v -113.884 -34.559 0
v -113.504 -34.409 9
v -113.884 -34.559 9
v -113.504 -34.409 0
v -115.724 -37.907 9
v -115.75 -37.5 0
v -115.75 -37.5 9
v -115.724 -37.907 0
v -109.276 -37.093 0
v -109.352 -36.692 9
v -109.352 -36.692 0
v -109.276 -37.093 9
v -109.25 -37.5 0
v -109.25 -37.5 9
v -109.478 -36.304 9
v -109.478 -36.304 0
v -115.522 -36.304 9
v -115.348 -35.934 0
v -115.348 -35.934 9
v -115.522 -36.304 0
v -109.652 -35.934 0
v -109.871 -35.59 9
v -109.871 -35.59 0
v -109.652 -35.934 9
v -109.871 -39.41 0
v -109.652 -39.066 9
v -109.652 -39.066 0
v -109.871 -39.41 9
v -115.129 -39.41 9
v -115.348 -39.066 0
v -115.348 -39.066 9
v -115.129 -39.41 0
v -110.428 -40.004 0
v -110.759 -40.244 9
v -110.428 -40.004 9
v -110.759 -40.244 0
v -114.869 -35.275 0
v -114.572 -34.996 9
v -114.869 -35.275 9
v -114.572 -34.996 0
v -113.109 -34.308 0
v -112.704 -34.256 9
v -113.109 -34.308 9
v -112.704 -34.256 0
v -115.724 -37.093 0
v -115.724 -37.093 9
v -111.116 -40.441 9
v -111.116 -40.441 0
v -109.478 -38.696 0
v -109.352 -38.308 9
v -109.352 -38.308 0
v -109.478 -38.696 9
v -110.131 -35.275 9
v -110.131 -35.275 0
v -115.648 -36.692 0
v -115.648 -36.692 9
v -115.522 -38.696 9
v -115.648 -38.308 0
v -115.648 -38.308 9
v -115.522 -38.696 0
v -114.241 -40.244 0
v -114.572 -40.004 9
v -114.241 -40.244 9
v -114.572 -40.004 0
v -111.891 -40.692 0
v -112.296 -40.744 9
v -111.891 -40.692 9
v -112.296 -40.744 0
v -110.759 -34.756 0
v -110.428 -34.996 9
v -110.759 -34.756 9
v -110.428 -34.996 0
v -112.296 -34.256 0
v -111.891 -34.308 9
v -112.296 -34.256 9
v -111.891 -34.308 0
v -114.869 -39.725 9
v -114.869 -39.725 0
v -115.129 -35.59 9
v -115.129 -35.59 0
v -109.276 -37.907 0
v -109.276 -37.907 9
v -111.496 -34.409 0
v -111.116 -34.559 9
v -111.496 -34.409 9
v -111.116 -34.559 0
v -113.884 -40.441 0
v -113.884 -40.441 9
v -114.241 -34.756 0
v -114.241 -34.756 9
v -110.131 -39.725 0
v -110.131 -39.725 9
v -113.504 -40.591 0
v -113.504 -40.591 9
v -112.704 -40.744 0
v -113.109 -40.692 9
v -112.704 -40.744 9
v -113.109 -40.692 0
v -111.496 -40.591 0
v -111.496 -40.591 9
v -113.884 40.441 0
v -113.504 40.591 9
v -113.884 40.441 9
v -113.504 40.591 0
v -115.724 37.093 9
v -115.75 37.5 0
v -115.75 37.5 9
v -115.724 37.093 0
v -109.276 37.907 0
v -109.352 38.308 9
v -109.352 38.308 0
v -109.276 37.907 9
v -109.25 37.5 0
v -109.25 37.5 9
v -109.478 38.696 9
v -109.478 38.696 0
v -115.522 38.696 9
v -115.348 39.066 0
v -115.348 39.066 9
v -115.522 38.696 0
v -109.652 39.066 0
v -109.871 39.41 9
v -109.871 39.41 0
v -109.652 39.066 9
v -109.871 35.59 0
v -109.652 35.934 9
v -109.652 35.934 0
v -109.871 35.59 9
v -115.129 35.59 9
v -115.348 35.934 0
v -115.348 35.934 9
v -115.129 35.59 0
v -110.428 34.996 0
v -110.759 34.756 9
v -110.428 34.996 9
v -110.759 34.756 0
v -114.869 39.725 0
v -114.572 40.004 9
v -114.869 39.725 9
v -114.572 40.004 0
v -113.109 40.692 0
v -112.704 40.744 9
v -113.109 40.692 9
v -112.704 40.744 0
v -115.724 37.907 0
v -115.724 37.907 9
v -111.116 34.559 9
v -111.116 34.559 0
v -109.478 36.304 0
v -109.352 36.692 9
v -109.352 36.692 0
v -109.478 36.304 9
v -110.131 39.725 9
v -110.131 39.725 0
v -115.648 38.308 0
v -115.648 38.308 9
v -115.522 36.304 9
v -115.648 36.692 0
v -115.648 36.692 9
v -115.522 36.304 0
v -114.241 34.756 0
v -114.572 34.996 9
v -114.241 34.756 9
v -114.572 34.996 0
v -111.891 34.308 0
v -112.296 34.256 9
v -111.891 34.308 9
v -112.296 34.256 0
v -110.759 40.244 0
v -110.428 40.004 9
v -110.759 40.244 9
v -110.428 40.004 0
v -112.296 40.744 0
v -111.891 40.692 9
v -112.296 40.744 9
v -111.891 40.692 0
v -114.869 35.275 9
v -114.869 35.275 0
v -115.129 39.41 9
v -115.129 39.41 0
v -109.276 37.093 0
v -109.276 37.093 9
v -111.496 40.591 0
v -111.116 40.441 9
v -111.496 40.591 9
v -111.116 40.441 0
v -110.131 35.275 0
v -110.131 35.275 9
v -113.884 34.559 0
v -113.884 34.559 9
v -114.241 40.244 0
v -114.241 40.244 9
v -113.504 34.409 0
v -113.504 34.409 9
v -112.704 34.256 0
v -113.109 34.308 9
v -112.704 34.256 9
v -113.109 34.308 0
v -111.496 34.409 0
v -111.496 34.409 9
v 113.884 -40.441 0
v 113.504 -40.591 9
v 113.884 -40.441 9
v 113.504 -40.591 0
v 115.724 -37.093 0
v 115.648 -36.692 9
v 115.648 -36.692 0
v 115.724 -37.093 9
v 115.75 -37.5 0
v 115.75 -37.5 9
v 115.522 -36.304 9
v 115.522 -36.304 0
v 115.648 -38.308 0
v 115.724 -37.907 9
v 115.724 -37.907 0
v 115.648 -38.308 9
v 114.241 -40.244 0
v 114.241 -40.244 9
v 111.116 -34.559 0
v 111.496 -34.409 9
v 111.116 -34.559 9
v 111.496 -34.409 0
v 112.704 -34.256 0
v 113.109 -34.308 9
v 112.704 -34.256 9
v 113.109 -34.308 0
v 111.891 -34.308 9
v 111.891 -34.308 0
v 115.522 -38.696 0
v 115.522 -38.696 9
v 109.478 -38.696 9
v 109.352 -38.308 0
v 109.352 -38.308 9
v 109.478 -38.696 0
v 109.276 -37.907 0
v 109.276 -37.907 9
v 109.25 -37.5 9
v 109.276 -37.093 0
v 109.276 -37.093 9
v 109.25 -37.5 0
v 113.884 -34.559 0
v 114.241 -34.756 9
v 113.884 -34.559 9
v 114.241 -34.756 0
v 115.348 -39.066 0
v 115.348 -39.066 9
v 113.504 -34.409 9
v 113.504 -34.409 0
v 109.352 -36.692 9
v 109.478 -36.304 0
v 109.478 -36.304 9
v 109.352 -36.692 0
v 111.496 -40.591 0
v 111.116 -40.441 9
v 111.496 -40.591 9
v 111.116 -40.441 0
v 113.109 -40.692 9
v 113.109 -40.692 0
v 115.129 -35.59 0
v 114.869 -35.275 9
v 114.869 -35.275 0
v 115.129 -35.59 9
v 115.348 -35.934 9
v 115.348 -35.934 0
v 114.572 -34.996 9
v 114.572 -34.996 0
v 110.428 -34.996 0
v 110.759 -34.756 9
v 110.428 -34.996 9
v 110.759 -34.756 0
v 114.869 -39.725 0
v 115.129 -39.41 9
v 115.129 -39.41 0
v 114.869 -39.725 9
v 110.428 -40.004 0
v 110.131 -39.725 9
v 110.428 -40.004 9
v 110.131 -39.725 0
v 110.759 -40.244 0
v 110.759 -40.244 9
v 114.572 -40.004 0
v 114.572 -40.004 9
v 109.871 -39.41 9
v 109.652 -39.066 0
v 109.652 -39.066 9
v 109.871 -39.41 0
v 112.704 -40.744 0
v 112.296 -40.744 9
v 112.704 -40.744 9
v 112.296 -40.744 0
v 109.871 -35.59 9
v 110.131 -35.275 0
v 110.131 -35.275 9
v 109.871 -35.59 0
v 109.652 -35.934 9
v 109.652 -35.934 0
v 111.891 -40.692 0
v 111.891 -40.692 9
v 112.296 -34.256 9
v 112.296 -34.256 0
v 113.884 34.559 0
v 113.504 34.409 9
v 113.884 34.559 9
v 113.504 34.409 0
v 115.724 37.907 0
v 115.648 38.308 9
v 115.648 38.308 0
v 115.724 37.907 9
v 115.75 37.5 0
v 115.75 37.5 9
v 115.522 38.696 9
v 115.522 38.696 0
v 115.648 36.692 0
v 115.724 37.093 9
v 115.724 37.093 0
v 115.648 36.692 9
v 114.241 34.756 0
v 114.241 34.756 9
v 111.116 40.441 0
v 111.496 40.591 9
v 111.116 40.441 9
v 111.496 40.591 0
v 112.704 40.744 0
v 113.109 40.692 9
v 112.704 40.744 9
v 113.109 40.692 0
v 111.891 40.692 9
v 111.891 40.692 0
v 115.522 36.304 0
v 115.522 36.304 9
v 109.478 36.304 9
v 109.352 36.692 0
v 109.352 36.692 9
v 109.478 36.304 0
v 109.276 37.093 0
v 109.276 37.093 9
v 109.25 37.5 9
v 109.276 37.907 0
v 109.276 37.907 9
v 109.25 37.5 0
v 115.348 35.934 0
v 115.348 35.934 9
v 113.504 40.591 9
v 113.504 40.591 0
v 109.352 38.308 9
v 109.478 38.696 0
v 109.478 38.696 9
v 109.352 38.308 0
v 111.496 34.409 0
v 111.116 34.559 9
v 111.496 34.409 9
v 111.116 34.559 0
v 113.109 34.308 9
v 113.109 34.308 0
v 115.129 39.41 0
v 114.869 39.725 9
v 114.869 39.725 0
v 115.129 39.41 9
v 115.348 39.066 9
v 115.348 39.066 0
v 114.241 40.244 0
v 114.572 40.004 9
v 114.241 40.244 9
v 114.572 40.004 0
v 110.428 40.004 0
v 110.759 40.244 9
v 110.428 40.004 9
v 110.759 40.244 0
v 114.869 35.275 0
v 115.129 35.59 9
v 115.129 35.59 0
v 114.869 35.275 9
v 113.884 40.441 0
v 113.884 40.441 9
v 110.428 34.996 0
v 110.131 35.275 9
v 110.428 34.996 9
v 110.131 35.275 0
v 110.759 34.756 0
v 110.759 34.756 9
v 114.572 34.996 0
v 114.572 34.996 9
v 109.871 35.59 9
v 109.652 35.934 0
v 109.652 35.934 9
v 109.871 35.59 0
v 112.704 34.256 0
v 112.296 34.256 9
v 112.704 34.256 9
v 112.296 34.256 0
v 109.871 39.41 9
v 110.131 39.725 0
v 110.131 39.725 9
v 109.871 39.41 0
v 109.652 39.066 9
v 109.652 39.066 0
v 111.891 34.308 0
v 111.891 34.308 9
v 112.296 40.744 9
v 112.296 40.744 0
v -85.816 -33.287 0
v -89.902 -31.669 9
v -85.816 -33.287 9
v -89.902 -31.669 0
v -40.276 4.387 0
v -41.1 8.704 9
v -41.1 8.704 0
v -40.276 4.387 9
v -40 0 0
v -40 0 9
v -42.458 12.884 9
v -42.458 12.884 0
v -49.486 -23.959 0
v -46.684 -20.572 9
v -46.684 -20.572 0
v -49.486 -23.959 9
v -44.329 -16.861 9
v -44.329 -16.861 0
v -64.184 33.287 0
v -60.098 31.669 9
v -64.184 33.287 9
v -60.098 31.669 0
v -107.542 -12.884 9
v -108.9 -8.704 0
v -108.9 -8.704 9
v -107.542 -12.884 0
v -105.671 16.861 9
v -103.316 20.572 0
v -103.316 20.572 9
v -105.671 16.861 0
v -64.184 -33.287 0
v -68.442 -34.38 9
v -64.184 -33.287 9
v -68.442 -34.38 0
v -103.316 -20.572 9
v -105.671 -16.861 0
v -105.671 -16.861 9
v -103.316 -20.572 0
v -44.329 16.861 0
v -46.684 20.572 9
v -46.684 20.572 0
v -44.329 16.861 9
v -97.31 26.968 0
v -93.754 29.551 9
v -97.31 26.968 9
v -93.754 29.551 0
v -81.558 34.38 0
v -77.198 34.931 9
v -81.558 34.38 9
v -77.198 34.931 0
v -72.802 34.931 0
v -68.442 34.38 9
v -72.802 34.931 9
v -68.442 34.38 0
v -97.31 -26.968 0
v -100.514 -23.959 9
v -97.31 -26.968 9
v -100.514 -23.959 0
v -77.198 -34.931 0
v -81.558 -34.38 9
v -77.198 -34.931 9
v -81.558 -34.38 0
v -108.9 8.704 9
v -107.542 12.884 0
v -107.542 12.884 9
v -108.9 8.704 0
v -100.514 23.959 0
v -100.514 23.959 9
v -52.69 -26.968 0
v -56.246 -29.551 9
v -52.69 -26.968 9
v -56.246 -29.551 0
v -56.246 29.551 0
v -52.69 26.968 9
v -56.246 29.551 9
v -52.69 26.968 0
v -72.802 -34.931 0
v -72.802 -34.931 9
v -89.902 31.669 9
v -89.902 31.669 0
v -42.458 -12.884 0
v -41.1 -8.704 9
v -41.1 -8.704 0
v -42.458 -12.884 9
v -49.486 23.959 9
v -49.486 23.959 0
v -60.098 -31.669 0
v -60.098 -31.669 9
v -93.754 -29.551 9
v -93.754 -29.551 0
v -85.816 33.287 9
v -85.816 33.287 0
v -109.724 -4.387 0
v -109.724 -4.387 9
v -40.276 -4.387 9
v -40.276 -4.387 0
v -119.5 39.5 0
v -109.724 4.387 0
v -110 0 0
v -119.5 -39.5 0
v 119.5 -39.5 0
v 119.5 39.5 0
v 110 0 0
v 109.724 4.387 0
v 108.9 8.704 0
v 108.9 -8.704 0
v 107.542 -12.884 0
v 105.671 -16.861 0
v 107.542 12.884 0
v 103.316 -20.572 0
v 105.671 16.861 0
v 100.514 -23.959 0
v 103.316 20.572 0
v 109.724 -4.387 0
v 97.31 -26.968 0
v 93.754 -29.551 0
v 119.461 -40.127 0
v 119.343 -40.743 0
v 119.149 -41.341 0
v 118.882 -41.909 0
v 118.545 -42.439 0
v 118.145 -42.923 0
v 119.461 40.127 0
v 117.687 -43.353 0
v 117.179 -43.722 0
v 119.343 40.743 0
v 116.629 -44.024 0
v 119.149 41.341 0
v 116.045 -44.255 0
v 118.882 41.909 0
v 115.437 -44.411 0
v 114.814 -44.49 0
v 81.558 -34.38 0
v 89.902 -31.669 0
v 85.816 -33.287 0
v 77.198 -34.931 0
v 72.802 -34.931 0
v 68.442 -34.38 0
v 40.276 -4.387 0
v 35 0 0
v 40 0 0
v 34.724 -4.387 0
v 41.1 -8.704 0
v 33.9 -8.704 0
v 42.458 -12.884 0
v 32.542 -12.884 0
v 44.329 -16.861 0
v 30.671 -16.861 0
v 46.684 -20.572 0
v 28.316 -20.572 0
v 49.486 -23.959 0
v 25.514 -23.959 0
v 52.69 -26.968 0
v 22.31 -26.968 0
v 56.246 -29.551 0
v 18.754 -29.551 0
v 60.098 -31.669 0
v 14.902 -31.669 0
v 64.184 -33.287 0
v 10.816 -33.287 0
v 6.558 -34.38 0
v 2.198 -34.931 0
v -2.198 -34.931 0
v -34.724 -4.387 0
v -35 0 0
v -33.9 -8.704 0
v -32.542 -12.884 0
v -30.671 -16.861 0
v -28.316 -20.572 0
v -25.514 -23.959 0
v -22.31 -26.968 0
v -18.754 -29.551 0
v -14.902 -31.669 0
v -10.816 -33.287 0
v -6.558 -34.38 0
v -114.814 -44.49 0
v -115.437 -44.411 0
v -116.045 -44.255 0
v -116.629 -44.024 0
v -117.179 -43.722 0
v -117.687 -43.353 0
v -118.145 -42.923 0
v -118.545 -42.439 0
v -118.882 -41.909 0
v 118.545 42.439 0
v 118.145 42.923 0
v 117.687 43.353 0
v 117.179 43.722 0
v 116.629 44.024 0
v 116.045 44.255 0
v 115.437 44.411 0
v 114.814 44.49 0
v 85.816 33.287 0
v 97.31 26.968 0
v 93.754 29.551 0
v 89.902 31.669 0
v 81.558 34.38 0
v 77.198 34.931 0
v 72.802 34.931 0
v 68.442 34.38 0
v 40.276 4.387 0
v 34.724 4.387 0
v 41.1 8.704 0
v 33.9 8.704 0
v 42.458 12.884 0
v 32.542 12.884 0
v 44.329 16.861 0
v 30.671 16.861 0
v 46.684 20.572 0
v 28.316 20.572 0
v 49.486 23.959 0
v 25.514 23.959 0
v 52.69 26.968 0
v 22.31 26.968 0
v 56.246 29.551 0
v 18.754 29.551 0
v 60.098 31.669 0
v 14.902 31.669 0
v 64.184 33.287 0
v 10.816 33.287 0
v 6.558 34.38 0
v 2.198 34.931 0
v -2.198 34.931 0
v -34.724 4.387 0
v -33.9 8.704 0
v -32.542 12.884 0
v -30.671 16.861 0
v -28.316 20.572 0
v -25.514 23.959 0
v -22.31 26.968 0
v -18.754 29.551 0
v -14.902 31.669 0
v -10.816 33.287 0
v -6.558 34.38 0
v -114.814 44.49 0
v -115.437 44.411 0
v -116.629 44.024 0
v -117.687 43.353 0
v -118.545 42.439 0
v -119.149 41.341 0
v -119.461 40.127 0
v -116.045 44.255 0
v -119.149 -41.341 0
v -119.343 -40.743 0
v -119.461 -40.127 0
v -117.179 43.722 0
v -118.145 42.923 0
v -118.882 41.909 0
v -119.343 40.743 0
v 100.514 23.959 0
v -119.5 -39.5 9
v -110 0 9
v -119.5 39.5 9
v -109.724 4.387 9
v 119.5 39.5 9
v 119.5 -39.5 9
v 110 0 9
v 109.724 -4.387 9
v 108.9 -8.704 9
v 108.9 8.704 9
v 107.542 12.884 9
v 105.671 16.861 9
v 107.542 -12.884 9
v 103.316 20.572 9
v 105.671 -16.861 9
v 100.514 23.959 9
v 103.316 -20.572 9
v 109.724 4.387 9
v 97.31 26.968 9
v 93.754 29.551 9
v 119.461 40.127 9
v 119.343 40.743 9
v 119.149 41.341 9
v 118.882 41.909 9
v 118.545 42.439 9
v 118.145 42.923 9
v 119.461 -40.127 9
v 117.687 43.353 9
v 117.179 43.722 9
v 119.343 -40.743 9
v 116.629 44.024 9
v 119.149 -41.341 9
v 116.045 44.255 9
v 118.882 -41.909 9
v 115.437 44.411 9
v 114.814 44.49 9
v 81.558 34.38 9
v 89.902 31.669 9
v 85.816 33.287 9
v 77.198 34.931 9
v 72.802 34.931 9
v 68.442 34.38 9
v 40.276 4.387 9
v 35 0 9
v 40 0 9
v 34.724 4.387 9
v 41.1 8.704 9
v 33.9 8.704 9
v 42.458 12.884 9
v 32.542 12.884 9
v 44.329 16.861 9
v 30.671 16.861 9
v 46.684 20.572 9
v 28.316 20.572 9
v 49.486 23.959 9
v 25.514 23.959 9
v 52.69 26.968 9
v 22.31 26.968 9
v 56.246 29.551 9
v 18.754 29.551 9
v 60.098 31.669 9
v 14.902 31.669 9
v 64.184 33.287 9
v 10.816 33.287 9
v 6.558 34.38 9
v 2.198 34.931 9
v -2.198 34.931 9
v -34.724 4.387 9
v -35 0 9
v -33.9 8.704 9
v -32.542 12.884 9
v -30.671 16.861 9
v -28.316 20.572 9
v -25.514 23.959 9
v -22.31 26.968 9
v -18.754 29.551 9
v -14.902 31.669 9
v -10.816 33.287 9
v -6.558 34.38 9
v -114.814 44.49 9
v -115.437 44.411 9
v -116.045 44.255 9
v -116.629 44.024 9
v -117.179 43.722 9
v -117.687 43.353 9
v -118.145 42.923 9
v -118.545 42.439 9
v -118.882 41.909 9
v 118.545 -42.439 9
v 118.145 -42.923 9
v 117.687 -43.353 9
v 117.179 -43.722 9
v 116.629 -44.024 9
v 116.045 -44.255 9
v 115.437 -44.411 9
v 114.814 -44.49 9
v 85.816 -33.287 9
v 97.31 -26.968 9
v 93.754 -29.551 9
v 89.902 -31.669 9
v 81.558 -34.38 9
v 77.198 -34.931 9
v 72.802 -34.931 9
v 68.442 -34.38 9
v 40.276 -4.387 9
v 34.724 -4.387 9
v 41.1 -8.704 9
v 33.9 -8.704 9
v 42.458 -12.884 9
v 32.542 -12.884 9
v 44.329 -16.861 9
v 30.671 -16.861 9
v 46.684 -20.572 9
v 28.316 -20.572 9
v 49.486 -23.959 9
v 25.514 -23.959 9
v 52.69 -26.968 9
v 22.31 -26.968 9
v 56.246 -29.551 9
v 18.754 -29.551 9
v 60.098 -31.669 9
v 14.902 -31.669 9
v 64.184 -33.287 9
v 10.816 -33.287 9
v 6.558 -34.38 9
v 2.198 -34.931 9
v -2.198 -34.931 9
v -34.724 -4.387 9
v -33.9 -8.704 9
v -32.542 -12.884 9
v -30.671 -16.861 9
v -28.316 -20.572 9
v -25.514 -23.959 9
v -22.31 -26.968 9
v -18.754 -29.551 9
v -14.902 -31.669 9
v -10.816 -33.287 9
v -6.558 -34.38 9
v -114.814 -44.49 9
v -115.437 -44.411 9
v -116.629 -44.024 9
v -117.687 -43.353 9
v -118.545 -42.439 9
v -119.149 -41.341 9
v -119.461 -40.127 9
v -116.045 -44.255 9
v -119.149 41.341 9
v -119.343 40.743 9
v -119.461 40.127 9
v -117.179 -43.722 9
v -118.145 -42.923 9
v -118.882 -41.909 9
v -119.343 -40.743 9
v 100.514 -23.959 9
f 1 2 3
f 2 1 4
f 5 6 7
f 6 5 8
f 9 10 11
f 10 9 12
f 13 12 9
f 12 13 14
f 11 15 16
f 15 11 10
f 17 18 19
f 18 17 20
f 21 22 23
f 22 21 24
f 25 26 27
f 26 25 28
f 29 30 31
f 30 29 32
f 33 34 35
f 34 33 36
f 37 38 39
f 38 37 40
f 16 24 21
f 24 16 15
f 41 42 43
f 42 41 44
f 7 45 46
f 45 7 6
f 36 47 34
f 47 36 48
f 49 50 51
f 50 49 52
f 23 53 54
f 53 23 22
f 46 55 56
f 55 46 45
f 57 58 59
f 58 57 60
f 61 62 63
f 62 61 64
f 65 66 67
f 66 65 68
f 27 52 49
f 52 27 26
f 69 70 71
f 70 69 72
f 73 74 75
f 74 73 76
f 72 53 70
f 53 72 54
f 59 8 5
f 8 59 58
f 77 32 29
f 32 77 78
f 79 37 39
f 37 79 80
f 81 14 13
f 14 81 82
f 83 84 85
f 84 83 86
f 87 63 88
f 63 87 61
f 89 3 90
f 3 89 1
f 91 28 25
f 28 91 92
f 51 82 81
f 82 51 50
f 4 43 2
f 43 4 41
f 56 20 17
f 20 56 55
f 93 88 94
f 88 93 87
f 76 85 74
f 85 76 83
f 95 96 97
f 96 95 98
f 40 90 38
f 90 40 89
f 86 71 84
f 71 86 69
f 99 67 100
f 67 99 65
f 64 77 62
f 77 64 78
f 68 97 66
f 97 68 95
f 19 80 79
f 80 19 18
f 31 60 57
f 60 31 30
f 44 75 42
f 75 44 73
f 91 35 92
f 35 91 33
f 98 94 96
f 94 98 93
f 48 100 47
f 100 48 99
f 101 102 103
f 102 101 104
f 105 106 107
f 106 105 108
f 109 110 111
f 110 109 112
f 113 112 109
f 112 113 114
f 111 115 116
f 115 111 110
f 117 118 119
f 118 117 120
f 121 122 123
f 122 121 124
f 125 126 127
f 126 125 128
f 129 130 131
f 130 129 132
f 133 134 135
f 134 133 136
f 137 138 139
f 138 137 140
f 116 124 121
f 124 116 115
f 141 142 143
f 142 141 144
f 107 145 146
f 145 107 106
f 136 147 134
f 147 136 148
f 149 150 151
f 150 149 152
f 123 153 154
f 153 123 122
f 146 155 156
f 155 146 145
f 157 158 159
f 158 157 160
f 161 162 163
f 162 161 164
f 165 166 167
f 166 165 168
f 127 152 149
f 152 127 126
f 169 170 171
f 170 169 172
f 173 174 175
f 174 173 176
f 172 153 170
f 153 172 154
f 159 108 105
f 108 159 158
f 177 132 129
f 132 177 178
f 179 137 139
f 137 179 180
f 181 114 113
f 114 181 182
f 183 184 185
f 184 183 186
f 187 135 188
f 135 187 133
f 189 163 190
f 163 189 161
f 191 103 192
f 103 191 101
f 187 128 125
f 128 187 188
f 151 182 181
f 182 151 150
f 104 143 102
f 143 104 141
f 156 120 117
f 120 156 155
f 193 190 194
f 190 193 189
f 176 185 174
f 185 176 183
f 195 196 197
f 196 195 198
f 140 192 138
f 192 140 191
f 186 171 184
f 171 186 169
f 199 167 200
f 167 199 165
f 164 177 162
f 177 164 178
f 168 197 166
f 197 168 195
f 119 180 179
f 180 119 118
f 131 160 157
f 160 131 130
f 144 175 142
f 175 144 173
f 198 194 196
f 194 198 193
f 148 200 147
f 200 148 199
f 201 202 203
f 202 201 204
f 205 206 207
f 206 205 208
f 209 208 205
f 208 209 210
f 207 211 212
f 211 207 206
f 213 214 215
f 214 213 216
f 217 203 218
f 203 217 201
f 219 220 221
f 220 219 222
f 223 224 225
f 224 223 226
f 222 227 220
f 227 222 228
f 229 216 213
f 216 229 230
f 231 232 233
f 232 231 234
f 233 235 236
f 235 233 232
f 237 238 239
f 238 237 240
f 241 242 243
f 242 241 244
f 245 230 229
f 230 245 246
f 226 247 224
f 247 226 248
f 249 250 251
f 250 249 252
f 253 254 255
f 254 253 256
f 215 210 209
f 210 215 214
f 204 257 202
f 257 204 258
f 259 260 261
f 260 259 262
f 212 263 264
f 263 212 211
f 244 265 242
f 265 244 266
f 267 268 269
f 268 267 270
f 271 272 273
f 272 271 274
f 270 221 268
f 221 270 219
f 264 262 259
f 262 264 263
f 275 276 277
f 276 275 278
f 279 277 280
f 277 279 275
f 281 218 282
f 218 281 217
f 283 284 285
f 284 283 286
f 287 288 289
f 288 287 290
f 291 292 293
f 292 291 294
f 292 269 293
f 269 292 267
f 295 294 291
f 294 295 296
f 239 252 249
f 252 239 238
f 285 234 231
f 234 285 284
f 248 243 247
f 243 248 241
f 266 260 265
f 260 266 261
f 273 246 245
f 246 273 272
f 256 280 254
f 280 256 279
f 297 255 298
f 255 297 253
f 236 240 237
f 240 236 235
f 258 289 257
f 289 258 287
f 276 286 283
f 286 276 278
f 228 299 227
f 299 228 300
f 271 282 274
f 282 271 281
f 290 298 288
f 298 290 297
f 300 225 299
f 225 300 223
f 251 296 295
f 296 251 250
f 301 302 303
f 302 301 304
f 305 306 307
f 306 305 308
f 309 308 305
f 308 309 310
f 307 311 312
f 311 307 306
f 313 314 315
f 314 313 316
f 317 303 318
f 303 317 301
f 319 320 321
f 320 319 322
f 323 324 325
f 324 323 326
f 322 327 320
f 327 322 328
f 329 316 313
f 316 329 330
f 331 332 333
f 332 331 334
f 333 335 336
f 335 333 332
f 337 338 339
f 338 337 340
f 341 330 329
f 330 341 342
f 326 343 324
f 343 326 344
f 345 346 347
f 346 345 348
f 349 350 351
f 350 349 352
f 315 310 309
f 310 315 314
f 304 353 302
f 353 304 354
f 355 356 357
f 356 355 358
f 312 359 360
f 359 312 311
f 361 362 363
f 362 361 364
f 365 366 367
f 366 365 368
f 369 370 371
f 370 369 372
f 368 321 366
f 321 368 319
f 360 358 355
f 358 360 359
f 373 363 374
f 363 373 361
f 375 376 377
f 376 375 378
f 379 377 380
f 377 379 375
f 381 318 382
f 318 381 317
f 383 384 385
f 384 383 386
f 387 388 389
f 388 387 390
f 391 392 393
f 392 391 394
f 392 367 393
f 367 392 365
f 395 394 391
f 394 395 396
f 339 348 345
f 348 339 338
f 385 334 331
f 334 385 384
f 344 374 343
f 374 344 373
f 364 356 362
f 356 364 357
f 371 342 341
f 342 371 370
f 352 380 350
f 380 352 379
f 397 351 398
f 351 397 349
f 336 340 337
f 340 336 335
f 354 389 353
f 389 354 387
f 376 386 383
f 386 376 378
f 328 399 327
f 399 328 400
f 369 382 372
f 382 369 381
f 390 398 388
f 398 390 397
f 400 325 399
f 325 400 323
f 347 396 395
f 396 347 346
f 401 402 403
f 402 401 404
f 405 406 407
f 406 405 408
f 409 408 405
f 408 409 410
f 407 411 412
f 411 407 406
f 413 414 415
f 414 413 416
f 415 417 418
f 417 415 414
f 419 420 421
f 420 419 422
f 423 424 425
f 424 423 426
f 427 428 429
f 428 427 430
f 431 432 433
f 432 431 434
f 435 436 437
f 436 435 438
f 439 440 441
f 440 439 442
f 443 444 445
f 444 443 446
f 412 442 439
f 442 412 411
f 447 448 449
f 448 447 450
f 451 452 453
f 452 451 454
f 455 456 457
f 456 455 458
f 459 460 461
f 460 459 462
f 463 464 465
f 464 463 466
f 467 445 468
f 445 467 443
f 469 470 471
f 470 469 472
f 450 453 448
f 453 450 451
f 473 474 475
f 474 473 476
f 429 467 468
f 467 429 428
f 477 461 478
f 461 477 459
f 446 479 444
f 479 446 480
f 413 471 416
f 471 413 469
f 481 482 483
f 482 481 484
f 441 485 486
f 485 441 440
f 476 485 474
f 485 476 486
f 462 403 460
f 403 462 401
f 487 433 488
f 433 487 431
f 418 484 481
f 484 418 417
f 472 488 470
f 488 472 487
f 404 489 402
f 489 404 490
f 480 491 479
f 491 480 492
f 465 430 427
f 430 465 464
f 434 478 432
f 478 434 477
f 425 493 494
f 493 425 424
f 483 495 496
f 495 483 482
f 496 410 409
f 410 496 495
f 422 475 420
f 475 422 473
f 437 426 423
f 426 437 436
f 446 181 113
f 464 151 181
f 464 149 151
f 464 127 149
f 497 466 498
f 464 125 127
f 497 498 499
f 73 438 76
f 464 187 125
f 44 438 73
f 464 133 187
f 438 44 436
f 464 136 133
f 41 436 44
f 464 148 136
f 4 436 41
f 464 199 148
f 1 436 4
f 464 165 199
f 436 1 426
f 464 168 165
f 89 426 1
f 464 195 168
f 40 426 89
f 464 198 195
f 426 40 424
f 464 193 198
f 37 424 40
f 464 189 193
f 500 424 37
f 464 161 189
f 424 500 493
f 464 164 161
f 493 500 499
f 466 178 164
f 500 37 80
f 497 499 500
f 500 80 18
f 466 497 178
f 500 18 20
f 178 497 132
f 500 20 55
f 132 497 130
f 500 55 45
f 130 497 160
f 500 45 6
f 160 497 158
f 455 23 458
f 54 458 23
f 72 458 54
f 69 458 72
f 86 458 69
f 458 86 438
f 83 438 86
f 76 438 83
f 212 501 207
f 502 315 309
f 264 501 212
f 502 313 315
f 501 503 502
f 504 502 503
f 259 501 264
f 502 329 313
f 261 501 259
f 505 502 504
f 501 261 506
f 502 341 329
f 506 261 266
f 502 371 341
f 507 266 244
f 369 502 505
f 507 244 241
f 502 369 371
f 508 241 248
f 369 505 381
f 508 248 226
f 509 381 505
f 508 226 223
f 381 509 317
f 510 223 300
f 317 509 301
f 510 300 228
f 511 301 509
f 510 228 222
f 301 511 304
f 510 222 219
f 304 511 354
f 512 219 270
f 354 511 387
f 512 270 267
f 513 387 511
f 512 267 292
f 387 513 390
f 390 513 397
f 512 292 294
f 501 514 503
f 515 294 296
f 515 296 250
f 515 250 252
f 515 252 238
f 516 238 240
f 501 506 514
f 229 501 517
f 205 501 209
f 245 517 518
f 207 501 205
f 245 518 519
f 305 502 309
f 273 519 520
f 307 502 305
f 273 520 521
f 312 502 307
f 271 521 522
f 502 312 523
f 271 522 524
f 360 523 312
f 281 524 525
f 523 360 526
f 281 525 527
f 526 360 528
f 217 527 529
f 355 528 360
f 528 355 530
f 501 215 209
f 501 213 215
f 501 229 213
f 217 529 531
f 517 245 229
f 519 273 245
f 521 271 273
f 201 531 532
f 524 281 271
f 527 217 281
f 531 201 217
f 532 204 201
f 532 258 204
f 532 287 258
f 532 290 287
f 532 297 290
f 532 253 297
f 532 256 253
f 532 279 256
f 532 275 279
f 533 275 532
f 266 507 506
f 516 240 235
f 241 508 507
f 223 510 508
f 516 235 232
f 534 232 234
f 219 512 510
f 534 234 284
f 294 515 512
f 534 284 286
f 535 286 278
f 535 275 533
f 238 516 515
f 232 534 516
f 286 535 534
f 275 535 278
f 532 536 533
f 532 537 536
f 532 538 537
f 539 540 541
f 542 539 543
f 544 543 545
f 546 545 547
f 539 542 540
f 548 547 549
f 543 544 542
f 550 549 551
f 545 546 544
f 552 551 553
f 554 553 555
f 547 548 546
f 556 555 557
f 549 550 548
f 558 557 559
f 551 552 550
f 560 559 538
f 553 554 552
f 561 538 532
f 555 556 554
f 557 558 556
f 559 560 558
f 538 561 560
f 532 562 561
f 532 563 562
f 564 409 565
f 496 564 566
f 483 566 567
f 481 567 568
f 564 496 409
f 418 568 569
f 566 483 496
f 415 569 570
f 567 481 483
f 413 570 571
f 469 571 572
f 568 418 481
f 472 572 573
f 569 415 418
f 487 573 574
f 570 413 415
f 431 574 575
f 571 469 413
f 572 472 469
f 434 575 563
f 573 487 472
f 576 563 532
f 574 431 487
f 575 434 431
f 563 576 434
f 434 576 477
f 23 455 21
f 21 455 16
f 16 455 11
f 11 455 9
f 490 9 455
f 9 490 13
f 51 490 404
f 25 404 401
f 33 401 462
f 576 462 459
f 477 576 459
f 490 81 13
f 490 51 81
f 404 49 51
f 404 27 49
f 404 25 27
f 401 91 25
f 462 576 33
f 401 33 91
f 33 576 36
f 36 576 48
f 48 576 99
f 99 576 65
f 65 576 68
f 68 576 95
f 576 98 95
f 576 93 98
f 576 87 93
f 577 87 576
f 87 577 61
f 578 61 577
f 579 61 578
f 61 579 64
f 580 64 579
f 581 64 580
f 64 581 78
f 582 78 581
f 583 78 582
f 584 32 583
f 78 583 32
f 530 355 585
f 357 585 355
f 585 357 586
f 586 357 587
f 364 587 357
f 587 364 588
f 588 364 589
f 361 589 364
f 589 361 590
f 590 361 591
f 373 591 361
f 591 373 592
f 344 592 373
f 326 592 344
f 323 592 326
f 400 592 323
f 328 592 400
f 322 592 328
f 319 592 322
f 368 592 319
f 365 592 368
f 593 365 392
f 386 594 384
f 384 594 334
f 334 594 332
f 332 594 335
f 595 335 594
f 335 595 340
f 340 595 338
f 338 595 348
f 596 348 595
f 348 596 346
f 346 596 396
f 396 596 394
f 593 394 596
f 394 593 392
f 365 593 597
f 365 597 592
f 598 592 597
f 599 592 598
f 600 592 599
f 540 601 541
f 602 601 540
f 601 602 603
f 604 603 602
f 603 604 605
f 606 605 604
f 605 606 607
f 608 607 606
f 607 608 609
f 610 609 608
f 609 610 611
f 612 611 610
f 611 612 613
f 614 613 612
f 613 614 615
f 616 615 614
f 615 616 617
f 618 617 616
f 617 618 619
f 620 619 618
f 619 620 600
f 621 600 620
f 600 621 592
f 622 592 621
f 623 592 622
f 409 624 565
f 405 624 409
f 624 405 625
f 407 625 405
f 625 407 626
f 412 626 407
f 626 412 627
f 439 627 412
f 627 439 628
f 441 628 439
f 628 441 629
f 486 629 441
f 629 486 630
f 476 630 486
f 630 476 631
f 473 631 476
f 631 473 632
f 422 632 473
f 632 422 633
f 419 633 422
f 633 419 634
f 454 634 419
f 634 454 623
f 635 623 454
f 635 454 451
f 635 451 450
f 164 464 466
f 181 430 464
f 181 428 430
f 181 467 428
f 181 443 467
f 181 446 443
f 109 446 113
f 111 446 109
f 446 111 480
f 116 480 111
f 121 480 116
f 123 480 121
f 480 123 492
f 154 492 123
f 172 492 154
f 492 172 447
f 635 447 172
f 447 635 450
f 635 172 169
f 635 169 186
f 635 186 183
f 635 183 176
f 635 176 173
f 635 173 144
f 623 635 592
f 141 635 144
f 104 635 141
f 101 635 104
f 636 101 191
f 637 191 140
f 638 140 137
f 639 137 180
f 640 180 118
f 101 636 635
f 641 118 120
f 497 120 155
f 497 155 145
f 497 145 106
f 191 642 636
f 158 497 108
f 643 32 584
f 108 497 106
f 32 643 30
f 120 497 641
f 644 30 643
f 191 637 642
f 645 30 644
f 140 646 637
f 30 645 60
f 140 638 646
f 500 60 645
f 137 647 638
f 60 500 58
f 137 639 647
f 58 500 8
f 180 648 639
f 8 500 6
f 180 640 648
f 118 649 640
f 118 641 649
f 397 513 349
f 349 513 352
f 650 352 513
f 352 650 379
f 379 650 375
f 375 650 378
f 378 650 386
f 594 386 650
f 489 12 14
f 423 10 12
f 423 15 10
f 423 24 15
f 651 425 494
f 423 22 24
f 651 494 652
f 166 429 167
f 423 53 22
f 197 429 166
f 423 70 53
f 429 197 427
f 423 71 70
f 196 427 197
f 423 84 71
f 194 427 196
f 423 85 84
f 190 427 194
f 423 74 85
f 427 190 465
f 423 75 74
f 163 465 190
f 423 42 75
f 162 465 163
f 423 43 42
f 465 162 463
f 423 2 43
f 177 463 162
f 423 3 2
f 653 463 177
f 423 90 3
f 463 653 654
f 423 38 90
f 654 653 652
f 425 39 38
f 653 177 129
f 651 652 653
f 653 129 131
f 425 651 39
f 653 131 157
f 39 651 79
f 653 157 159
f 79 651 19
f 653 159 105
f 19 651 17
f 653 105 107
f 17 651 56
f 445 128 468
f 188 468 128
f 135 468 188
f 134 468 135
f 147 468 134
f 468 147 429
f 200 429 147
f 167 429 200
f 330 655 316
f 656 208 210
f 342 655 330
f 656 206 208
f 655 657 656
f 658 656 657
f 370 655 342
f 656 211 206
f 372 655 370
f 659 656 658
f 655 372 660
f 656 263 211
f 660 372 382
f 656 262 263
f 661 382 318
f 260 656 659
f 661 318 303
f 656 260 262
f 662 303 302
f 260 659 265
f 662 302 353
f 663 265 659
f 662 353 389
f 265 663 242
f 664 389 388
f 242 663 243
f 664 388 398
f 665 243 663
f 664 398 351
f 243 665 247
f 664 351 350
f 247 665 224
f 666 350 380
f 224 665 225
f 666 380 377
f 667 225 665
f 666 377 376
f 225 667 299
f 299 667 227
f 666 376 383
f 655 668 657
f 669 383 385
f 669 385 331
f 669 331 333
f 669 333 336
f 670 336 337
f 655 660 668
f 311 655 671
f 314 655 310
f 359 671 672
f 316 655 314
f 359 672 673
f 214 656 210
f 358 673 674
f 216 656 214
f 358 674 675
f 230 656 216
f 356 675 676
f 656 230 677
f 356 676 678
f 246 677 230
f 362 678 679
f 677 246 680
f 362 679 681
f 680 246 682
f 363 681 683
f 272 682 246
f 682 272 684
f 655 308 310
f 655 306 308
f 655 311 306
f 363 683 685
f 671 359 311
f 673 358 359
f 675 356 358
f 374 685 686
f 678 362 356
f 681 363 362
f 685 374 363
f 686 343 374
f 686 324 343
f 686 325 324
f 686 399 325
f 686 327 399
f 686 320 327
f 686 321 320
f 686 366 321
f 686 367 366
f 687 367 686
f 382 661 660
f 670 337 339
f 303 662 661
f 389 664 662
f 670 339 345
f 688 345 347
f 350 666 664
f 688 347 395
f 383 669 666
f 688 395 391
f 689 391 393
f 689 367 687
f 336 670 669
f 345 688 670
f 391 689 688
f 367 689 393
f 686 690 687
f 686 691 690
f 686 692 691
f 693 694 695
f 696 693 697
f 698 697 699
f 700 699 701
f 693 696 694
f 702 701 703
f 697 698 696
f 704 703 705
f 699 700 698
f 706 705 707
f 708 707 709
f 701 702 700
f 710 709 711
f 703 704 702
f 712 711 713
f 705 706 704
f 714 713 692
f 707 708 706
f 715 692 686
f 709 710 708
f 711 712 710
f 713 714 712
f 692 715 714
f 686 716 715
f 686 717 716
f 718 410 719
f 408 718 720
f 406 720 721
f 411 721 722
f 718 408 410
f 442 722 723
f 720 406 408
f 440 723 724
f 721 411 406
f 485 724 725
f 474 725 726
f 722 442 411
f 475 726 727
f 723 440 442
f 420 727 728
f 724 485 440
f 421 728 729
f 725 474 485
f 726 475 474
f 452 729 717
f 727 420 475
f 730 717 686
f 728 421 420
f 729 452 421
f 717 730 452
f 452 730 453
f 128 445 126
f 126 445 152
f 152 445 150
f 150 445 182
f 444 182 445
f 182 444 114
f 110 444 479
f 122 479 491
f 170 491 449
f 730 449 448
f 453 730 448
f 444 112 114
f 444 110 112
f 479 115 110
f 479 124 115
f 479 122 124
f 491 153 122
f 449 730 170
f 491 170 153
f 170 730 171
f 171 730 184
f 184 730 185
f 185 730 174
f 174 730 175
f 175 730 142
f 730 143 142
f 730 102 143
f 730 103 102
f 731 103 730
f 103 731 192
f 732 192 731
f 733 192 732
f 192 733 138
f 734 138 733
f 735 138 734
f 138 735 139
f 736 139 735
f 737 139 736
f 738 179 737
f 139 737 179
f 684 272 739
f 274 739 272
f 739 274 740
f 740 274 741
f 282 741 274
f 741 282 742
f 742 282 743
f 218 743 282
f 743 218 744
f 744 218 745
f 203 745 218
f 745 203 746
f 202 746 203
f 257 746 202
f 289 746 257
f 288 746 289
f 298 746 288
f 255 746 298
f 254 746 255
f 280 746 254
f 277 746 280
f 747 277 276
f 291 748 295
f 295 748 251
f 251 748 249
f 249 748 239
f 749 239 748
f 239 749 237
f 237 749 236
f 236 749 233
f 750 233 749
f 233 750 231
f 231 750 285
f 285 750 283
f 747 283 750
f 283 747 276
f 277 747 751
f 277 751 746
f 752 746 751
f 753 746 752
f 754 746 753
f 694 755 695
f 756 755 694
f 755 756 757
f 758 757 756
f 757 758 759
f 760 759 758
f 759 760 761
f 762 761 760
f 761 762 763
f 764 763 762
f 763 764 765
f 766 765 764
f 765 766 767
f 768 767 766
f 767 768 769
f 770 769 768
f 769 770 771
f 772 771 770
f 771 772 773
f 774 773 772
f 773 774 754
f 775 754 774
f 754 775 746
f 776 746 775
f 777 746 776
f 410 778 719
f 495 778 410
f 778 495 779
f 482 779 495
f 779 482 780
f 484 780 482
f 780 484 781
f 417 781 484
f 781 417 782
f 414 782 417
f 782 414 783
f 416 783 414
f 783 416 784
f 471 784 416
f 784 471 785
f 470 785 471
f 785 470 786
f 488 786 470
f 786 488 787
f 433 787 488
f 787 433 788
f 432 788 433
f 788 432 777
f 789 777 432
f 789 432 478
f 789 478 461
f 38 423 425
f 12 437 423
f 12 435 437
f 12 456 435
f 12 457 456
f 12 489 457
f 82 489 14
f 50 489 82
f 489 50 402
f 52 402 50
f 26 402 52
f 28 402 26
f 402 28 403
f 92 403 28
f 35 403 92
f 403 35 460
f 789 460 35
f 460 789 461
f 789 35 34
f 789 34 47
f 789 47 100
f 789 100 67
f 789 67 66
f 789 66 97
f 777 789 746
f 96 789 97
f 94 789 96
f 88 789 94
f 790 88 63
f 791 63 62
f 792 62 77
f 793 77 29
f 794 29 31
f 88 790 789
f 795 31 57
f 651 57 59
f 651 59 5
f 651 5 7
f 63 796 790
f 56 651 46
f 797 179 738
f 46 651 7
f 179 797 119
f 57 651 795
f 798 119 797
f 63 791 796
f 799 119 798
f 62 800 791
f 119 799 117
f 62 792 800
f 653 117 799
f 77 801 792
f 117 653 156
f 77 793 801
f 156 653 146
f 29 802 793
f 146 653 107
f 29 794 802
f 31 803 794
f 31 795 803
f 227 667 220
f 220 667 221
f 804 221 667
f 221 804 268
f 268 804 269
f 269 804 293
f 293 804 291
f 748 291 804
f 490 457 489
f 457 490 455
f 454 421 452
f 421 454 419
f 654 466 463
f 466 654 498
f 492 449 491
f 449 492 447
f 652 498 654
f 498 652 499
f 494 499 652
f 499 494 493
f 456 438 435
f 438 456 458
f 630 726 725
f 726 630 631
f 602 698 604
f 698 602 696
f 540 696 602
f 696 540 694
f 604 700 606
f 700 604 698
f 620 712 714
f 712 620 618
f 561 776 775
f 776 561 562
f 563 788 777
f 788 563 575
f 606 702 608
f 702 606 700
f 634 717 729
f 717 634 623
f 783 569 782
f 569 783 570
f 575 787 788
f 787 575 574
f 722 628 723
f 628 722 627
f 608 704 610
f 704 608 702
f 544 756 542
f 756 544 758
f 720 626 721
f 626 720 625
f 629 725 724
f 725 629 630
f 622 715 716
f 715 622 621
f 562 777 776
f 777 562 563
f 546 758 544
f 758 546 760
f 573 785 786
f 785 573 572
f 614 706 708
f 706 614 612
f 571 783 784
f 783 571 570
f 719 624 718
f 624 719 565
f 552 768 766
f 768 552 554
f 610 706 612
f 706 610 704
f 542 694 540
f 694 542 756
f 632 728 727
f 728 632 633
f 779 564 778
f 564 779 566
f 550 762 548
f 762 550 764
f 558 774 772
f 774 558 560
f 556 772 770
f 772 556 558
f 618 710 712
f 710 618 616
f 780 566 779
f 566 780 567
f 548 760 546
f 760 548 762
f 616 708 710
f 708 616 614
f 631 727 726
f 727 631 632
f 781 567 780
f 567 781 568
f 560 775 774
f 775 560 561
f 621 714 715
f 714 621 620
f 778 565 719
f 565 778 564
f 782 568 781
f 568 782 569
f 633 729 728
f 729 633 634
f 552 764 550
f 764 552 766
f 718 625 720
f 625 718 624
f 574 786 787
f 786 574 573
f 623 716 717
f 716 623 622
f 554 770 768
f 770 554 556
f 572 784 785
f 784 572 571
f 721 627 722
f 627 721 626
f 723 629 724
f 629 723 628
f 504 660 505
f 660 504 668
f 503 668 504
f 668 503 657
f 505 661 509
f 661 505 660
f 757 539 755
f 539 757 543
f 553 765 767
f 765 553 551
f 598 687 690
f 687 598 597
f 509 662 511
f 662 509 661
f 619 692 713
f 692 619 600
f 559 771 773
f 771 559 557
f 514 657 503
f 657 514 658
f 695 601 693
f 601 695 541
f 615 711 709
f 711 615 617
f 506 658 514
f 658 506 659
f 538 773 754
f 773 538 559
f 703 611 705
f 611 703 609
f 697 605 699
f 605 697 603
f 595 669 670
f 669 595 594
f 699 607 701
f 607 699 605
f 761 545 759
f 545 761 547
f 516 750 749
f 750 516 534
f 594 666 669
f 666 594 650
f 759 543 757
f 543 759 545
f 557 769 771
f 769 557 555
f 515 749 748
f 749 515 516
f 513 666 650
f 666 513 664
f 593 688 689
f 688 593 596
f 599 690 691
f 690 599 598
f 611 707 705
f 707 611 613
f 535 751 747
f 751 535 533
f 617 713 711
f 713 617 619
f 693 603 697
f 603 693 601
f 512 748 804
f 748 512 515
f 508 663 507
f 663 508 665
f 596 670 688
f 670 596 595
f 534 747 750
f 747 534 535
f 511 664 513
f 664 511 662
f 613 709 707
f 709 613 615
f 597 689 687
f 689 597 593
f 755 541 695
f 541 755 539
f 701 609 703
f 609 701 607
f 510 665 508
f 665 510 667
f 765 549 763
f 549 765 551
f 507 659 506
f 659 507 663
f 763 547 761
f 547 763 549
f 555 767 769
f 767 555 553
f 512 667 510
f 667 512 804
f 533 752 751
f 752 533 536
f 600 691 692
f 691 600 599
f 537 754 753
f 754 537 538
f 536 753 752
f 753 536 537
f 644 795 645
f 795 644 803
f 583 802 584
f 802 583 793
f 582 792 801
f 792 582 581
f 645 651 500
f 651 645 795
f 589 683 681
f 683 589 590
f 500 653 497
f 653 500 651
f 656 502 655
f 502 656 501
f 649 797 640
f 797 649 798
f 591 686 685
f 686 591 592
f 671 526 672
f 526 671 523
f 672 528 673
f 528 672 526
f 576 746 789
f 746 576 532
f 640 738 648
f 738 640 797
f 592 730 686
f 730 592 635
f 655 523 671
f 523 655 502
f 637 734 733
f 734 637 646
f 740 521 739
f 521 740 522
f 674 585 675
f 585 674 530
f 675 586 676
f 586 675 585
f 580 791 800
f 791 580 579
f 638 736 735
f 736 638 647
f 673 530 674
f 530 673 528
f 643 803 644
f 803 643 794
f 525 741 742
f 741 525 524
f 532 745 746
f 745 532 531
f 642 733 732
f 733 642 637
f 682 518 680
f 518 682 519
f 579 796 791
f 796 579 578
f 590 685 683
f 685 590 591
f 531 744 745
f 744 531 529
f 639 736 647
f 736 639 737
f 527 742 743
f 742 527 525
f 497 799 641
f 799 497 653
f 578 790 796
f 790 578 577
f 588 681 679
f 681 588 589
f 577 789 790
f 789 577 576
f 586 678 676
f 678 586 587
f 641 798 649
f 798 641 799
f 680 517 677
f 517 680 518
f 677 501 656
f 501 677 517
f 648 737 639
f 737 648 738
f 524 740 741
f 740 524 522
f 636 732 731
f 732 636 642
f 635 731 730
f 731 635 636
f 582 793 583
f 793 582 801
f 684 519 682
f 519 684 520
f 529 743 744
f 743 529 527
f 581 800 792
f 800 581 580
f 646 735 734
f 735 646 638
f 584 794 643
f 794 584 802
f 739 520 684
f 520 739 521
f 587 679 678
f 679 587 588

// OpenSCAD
$fn = 50;

difference() {
	union() {
		hull() {
			translate(v = [-114.5, 39.5, 0]) {
				cylinder(h = 9, r = 5);
			}
			translate(v = [114.5, 39.5, 0]) {
				cylinder(h = 9, r = 5);
			}
			translate(v = [-114.5, -39.5, 0]) {
				cylinder(h = 9, r = 5);
			}
			translate(v = [114.5, -39.5, 0]) {
				cylinder(h = 9, r = 5);
			}
		}
	}
	union() {
		translate(v = [-112.5, -37.5, -100.0]) {
			cylinder(h = 200, r = 3.25);
		}
		translate(v = [-112.5, 37.5, -100.0]) {
			cylinder(h = 200, r = 3.25);
		}
		translate(v = [112.5, -37.5, -100.0]) {
			cylinder(h = 200, r = 3.25);
		}
		translate(v = [112.5, 37.5, -100.0]) {
			cylinder(h = 200, r = 3.25);
		}
		translate(v = [-112.5, -37.5, -100.0]) {
			cylinder(h = 200, r = 1.8);
		}
		translate(v = [-112.5, 37.5, -100.0]) {
			cylinder(h = 200, r = 1.8);
		}
		translate(v = [112.5, -37.5, -100.0]) {
			cylinder(h = 200, r = 1.8);
		}
		translate(v = [112.5, 37.5, -100.0]) {
			cylinder(h = 200, r = 1.8);
		}
		translate(v = [-75.0, 0, 0.0]) {
			cylinder(h = 9, r = 35.0);
		}
		cylinder(h = 9, r = 35.0);
		translate(v = [75.0, 0, 0.0]) {
			cylinder(h = 9, r = 35.0);
		}
	}
}
